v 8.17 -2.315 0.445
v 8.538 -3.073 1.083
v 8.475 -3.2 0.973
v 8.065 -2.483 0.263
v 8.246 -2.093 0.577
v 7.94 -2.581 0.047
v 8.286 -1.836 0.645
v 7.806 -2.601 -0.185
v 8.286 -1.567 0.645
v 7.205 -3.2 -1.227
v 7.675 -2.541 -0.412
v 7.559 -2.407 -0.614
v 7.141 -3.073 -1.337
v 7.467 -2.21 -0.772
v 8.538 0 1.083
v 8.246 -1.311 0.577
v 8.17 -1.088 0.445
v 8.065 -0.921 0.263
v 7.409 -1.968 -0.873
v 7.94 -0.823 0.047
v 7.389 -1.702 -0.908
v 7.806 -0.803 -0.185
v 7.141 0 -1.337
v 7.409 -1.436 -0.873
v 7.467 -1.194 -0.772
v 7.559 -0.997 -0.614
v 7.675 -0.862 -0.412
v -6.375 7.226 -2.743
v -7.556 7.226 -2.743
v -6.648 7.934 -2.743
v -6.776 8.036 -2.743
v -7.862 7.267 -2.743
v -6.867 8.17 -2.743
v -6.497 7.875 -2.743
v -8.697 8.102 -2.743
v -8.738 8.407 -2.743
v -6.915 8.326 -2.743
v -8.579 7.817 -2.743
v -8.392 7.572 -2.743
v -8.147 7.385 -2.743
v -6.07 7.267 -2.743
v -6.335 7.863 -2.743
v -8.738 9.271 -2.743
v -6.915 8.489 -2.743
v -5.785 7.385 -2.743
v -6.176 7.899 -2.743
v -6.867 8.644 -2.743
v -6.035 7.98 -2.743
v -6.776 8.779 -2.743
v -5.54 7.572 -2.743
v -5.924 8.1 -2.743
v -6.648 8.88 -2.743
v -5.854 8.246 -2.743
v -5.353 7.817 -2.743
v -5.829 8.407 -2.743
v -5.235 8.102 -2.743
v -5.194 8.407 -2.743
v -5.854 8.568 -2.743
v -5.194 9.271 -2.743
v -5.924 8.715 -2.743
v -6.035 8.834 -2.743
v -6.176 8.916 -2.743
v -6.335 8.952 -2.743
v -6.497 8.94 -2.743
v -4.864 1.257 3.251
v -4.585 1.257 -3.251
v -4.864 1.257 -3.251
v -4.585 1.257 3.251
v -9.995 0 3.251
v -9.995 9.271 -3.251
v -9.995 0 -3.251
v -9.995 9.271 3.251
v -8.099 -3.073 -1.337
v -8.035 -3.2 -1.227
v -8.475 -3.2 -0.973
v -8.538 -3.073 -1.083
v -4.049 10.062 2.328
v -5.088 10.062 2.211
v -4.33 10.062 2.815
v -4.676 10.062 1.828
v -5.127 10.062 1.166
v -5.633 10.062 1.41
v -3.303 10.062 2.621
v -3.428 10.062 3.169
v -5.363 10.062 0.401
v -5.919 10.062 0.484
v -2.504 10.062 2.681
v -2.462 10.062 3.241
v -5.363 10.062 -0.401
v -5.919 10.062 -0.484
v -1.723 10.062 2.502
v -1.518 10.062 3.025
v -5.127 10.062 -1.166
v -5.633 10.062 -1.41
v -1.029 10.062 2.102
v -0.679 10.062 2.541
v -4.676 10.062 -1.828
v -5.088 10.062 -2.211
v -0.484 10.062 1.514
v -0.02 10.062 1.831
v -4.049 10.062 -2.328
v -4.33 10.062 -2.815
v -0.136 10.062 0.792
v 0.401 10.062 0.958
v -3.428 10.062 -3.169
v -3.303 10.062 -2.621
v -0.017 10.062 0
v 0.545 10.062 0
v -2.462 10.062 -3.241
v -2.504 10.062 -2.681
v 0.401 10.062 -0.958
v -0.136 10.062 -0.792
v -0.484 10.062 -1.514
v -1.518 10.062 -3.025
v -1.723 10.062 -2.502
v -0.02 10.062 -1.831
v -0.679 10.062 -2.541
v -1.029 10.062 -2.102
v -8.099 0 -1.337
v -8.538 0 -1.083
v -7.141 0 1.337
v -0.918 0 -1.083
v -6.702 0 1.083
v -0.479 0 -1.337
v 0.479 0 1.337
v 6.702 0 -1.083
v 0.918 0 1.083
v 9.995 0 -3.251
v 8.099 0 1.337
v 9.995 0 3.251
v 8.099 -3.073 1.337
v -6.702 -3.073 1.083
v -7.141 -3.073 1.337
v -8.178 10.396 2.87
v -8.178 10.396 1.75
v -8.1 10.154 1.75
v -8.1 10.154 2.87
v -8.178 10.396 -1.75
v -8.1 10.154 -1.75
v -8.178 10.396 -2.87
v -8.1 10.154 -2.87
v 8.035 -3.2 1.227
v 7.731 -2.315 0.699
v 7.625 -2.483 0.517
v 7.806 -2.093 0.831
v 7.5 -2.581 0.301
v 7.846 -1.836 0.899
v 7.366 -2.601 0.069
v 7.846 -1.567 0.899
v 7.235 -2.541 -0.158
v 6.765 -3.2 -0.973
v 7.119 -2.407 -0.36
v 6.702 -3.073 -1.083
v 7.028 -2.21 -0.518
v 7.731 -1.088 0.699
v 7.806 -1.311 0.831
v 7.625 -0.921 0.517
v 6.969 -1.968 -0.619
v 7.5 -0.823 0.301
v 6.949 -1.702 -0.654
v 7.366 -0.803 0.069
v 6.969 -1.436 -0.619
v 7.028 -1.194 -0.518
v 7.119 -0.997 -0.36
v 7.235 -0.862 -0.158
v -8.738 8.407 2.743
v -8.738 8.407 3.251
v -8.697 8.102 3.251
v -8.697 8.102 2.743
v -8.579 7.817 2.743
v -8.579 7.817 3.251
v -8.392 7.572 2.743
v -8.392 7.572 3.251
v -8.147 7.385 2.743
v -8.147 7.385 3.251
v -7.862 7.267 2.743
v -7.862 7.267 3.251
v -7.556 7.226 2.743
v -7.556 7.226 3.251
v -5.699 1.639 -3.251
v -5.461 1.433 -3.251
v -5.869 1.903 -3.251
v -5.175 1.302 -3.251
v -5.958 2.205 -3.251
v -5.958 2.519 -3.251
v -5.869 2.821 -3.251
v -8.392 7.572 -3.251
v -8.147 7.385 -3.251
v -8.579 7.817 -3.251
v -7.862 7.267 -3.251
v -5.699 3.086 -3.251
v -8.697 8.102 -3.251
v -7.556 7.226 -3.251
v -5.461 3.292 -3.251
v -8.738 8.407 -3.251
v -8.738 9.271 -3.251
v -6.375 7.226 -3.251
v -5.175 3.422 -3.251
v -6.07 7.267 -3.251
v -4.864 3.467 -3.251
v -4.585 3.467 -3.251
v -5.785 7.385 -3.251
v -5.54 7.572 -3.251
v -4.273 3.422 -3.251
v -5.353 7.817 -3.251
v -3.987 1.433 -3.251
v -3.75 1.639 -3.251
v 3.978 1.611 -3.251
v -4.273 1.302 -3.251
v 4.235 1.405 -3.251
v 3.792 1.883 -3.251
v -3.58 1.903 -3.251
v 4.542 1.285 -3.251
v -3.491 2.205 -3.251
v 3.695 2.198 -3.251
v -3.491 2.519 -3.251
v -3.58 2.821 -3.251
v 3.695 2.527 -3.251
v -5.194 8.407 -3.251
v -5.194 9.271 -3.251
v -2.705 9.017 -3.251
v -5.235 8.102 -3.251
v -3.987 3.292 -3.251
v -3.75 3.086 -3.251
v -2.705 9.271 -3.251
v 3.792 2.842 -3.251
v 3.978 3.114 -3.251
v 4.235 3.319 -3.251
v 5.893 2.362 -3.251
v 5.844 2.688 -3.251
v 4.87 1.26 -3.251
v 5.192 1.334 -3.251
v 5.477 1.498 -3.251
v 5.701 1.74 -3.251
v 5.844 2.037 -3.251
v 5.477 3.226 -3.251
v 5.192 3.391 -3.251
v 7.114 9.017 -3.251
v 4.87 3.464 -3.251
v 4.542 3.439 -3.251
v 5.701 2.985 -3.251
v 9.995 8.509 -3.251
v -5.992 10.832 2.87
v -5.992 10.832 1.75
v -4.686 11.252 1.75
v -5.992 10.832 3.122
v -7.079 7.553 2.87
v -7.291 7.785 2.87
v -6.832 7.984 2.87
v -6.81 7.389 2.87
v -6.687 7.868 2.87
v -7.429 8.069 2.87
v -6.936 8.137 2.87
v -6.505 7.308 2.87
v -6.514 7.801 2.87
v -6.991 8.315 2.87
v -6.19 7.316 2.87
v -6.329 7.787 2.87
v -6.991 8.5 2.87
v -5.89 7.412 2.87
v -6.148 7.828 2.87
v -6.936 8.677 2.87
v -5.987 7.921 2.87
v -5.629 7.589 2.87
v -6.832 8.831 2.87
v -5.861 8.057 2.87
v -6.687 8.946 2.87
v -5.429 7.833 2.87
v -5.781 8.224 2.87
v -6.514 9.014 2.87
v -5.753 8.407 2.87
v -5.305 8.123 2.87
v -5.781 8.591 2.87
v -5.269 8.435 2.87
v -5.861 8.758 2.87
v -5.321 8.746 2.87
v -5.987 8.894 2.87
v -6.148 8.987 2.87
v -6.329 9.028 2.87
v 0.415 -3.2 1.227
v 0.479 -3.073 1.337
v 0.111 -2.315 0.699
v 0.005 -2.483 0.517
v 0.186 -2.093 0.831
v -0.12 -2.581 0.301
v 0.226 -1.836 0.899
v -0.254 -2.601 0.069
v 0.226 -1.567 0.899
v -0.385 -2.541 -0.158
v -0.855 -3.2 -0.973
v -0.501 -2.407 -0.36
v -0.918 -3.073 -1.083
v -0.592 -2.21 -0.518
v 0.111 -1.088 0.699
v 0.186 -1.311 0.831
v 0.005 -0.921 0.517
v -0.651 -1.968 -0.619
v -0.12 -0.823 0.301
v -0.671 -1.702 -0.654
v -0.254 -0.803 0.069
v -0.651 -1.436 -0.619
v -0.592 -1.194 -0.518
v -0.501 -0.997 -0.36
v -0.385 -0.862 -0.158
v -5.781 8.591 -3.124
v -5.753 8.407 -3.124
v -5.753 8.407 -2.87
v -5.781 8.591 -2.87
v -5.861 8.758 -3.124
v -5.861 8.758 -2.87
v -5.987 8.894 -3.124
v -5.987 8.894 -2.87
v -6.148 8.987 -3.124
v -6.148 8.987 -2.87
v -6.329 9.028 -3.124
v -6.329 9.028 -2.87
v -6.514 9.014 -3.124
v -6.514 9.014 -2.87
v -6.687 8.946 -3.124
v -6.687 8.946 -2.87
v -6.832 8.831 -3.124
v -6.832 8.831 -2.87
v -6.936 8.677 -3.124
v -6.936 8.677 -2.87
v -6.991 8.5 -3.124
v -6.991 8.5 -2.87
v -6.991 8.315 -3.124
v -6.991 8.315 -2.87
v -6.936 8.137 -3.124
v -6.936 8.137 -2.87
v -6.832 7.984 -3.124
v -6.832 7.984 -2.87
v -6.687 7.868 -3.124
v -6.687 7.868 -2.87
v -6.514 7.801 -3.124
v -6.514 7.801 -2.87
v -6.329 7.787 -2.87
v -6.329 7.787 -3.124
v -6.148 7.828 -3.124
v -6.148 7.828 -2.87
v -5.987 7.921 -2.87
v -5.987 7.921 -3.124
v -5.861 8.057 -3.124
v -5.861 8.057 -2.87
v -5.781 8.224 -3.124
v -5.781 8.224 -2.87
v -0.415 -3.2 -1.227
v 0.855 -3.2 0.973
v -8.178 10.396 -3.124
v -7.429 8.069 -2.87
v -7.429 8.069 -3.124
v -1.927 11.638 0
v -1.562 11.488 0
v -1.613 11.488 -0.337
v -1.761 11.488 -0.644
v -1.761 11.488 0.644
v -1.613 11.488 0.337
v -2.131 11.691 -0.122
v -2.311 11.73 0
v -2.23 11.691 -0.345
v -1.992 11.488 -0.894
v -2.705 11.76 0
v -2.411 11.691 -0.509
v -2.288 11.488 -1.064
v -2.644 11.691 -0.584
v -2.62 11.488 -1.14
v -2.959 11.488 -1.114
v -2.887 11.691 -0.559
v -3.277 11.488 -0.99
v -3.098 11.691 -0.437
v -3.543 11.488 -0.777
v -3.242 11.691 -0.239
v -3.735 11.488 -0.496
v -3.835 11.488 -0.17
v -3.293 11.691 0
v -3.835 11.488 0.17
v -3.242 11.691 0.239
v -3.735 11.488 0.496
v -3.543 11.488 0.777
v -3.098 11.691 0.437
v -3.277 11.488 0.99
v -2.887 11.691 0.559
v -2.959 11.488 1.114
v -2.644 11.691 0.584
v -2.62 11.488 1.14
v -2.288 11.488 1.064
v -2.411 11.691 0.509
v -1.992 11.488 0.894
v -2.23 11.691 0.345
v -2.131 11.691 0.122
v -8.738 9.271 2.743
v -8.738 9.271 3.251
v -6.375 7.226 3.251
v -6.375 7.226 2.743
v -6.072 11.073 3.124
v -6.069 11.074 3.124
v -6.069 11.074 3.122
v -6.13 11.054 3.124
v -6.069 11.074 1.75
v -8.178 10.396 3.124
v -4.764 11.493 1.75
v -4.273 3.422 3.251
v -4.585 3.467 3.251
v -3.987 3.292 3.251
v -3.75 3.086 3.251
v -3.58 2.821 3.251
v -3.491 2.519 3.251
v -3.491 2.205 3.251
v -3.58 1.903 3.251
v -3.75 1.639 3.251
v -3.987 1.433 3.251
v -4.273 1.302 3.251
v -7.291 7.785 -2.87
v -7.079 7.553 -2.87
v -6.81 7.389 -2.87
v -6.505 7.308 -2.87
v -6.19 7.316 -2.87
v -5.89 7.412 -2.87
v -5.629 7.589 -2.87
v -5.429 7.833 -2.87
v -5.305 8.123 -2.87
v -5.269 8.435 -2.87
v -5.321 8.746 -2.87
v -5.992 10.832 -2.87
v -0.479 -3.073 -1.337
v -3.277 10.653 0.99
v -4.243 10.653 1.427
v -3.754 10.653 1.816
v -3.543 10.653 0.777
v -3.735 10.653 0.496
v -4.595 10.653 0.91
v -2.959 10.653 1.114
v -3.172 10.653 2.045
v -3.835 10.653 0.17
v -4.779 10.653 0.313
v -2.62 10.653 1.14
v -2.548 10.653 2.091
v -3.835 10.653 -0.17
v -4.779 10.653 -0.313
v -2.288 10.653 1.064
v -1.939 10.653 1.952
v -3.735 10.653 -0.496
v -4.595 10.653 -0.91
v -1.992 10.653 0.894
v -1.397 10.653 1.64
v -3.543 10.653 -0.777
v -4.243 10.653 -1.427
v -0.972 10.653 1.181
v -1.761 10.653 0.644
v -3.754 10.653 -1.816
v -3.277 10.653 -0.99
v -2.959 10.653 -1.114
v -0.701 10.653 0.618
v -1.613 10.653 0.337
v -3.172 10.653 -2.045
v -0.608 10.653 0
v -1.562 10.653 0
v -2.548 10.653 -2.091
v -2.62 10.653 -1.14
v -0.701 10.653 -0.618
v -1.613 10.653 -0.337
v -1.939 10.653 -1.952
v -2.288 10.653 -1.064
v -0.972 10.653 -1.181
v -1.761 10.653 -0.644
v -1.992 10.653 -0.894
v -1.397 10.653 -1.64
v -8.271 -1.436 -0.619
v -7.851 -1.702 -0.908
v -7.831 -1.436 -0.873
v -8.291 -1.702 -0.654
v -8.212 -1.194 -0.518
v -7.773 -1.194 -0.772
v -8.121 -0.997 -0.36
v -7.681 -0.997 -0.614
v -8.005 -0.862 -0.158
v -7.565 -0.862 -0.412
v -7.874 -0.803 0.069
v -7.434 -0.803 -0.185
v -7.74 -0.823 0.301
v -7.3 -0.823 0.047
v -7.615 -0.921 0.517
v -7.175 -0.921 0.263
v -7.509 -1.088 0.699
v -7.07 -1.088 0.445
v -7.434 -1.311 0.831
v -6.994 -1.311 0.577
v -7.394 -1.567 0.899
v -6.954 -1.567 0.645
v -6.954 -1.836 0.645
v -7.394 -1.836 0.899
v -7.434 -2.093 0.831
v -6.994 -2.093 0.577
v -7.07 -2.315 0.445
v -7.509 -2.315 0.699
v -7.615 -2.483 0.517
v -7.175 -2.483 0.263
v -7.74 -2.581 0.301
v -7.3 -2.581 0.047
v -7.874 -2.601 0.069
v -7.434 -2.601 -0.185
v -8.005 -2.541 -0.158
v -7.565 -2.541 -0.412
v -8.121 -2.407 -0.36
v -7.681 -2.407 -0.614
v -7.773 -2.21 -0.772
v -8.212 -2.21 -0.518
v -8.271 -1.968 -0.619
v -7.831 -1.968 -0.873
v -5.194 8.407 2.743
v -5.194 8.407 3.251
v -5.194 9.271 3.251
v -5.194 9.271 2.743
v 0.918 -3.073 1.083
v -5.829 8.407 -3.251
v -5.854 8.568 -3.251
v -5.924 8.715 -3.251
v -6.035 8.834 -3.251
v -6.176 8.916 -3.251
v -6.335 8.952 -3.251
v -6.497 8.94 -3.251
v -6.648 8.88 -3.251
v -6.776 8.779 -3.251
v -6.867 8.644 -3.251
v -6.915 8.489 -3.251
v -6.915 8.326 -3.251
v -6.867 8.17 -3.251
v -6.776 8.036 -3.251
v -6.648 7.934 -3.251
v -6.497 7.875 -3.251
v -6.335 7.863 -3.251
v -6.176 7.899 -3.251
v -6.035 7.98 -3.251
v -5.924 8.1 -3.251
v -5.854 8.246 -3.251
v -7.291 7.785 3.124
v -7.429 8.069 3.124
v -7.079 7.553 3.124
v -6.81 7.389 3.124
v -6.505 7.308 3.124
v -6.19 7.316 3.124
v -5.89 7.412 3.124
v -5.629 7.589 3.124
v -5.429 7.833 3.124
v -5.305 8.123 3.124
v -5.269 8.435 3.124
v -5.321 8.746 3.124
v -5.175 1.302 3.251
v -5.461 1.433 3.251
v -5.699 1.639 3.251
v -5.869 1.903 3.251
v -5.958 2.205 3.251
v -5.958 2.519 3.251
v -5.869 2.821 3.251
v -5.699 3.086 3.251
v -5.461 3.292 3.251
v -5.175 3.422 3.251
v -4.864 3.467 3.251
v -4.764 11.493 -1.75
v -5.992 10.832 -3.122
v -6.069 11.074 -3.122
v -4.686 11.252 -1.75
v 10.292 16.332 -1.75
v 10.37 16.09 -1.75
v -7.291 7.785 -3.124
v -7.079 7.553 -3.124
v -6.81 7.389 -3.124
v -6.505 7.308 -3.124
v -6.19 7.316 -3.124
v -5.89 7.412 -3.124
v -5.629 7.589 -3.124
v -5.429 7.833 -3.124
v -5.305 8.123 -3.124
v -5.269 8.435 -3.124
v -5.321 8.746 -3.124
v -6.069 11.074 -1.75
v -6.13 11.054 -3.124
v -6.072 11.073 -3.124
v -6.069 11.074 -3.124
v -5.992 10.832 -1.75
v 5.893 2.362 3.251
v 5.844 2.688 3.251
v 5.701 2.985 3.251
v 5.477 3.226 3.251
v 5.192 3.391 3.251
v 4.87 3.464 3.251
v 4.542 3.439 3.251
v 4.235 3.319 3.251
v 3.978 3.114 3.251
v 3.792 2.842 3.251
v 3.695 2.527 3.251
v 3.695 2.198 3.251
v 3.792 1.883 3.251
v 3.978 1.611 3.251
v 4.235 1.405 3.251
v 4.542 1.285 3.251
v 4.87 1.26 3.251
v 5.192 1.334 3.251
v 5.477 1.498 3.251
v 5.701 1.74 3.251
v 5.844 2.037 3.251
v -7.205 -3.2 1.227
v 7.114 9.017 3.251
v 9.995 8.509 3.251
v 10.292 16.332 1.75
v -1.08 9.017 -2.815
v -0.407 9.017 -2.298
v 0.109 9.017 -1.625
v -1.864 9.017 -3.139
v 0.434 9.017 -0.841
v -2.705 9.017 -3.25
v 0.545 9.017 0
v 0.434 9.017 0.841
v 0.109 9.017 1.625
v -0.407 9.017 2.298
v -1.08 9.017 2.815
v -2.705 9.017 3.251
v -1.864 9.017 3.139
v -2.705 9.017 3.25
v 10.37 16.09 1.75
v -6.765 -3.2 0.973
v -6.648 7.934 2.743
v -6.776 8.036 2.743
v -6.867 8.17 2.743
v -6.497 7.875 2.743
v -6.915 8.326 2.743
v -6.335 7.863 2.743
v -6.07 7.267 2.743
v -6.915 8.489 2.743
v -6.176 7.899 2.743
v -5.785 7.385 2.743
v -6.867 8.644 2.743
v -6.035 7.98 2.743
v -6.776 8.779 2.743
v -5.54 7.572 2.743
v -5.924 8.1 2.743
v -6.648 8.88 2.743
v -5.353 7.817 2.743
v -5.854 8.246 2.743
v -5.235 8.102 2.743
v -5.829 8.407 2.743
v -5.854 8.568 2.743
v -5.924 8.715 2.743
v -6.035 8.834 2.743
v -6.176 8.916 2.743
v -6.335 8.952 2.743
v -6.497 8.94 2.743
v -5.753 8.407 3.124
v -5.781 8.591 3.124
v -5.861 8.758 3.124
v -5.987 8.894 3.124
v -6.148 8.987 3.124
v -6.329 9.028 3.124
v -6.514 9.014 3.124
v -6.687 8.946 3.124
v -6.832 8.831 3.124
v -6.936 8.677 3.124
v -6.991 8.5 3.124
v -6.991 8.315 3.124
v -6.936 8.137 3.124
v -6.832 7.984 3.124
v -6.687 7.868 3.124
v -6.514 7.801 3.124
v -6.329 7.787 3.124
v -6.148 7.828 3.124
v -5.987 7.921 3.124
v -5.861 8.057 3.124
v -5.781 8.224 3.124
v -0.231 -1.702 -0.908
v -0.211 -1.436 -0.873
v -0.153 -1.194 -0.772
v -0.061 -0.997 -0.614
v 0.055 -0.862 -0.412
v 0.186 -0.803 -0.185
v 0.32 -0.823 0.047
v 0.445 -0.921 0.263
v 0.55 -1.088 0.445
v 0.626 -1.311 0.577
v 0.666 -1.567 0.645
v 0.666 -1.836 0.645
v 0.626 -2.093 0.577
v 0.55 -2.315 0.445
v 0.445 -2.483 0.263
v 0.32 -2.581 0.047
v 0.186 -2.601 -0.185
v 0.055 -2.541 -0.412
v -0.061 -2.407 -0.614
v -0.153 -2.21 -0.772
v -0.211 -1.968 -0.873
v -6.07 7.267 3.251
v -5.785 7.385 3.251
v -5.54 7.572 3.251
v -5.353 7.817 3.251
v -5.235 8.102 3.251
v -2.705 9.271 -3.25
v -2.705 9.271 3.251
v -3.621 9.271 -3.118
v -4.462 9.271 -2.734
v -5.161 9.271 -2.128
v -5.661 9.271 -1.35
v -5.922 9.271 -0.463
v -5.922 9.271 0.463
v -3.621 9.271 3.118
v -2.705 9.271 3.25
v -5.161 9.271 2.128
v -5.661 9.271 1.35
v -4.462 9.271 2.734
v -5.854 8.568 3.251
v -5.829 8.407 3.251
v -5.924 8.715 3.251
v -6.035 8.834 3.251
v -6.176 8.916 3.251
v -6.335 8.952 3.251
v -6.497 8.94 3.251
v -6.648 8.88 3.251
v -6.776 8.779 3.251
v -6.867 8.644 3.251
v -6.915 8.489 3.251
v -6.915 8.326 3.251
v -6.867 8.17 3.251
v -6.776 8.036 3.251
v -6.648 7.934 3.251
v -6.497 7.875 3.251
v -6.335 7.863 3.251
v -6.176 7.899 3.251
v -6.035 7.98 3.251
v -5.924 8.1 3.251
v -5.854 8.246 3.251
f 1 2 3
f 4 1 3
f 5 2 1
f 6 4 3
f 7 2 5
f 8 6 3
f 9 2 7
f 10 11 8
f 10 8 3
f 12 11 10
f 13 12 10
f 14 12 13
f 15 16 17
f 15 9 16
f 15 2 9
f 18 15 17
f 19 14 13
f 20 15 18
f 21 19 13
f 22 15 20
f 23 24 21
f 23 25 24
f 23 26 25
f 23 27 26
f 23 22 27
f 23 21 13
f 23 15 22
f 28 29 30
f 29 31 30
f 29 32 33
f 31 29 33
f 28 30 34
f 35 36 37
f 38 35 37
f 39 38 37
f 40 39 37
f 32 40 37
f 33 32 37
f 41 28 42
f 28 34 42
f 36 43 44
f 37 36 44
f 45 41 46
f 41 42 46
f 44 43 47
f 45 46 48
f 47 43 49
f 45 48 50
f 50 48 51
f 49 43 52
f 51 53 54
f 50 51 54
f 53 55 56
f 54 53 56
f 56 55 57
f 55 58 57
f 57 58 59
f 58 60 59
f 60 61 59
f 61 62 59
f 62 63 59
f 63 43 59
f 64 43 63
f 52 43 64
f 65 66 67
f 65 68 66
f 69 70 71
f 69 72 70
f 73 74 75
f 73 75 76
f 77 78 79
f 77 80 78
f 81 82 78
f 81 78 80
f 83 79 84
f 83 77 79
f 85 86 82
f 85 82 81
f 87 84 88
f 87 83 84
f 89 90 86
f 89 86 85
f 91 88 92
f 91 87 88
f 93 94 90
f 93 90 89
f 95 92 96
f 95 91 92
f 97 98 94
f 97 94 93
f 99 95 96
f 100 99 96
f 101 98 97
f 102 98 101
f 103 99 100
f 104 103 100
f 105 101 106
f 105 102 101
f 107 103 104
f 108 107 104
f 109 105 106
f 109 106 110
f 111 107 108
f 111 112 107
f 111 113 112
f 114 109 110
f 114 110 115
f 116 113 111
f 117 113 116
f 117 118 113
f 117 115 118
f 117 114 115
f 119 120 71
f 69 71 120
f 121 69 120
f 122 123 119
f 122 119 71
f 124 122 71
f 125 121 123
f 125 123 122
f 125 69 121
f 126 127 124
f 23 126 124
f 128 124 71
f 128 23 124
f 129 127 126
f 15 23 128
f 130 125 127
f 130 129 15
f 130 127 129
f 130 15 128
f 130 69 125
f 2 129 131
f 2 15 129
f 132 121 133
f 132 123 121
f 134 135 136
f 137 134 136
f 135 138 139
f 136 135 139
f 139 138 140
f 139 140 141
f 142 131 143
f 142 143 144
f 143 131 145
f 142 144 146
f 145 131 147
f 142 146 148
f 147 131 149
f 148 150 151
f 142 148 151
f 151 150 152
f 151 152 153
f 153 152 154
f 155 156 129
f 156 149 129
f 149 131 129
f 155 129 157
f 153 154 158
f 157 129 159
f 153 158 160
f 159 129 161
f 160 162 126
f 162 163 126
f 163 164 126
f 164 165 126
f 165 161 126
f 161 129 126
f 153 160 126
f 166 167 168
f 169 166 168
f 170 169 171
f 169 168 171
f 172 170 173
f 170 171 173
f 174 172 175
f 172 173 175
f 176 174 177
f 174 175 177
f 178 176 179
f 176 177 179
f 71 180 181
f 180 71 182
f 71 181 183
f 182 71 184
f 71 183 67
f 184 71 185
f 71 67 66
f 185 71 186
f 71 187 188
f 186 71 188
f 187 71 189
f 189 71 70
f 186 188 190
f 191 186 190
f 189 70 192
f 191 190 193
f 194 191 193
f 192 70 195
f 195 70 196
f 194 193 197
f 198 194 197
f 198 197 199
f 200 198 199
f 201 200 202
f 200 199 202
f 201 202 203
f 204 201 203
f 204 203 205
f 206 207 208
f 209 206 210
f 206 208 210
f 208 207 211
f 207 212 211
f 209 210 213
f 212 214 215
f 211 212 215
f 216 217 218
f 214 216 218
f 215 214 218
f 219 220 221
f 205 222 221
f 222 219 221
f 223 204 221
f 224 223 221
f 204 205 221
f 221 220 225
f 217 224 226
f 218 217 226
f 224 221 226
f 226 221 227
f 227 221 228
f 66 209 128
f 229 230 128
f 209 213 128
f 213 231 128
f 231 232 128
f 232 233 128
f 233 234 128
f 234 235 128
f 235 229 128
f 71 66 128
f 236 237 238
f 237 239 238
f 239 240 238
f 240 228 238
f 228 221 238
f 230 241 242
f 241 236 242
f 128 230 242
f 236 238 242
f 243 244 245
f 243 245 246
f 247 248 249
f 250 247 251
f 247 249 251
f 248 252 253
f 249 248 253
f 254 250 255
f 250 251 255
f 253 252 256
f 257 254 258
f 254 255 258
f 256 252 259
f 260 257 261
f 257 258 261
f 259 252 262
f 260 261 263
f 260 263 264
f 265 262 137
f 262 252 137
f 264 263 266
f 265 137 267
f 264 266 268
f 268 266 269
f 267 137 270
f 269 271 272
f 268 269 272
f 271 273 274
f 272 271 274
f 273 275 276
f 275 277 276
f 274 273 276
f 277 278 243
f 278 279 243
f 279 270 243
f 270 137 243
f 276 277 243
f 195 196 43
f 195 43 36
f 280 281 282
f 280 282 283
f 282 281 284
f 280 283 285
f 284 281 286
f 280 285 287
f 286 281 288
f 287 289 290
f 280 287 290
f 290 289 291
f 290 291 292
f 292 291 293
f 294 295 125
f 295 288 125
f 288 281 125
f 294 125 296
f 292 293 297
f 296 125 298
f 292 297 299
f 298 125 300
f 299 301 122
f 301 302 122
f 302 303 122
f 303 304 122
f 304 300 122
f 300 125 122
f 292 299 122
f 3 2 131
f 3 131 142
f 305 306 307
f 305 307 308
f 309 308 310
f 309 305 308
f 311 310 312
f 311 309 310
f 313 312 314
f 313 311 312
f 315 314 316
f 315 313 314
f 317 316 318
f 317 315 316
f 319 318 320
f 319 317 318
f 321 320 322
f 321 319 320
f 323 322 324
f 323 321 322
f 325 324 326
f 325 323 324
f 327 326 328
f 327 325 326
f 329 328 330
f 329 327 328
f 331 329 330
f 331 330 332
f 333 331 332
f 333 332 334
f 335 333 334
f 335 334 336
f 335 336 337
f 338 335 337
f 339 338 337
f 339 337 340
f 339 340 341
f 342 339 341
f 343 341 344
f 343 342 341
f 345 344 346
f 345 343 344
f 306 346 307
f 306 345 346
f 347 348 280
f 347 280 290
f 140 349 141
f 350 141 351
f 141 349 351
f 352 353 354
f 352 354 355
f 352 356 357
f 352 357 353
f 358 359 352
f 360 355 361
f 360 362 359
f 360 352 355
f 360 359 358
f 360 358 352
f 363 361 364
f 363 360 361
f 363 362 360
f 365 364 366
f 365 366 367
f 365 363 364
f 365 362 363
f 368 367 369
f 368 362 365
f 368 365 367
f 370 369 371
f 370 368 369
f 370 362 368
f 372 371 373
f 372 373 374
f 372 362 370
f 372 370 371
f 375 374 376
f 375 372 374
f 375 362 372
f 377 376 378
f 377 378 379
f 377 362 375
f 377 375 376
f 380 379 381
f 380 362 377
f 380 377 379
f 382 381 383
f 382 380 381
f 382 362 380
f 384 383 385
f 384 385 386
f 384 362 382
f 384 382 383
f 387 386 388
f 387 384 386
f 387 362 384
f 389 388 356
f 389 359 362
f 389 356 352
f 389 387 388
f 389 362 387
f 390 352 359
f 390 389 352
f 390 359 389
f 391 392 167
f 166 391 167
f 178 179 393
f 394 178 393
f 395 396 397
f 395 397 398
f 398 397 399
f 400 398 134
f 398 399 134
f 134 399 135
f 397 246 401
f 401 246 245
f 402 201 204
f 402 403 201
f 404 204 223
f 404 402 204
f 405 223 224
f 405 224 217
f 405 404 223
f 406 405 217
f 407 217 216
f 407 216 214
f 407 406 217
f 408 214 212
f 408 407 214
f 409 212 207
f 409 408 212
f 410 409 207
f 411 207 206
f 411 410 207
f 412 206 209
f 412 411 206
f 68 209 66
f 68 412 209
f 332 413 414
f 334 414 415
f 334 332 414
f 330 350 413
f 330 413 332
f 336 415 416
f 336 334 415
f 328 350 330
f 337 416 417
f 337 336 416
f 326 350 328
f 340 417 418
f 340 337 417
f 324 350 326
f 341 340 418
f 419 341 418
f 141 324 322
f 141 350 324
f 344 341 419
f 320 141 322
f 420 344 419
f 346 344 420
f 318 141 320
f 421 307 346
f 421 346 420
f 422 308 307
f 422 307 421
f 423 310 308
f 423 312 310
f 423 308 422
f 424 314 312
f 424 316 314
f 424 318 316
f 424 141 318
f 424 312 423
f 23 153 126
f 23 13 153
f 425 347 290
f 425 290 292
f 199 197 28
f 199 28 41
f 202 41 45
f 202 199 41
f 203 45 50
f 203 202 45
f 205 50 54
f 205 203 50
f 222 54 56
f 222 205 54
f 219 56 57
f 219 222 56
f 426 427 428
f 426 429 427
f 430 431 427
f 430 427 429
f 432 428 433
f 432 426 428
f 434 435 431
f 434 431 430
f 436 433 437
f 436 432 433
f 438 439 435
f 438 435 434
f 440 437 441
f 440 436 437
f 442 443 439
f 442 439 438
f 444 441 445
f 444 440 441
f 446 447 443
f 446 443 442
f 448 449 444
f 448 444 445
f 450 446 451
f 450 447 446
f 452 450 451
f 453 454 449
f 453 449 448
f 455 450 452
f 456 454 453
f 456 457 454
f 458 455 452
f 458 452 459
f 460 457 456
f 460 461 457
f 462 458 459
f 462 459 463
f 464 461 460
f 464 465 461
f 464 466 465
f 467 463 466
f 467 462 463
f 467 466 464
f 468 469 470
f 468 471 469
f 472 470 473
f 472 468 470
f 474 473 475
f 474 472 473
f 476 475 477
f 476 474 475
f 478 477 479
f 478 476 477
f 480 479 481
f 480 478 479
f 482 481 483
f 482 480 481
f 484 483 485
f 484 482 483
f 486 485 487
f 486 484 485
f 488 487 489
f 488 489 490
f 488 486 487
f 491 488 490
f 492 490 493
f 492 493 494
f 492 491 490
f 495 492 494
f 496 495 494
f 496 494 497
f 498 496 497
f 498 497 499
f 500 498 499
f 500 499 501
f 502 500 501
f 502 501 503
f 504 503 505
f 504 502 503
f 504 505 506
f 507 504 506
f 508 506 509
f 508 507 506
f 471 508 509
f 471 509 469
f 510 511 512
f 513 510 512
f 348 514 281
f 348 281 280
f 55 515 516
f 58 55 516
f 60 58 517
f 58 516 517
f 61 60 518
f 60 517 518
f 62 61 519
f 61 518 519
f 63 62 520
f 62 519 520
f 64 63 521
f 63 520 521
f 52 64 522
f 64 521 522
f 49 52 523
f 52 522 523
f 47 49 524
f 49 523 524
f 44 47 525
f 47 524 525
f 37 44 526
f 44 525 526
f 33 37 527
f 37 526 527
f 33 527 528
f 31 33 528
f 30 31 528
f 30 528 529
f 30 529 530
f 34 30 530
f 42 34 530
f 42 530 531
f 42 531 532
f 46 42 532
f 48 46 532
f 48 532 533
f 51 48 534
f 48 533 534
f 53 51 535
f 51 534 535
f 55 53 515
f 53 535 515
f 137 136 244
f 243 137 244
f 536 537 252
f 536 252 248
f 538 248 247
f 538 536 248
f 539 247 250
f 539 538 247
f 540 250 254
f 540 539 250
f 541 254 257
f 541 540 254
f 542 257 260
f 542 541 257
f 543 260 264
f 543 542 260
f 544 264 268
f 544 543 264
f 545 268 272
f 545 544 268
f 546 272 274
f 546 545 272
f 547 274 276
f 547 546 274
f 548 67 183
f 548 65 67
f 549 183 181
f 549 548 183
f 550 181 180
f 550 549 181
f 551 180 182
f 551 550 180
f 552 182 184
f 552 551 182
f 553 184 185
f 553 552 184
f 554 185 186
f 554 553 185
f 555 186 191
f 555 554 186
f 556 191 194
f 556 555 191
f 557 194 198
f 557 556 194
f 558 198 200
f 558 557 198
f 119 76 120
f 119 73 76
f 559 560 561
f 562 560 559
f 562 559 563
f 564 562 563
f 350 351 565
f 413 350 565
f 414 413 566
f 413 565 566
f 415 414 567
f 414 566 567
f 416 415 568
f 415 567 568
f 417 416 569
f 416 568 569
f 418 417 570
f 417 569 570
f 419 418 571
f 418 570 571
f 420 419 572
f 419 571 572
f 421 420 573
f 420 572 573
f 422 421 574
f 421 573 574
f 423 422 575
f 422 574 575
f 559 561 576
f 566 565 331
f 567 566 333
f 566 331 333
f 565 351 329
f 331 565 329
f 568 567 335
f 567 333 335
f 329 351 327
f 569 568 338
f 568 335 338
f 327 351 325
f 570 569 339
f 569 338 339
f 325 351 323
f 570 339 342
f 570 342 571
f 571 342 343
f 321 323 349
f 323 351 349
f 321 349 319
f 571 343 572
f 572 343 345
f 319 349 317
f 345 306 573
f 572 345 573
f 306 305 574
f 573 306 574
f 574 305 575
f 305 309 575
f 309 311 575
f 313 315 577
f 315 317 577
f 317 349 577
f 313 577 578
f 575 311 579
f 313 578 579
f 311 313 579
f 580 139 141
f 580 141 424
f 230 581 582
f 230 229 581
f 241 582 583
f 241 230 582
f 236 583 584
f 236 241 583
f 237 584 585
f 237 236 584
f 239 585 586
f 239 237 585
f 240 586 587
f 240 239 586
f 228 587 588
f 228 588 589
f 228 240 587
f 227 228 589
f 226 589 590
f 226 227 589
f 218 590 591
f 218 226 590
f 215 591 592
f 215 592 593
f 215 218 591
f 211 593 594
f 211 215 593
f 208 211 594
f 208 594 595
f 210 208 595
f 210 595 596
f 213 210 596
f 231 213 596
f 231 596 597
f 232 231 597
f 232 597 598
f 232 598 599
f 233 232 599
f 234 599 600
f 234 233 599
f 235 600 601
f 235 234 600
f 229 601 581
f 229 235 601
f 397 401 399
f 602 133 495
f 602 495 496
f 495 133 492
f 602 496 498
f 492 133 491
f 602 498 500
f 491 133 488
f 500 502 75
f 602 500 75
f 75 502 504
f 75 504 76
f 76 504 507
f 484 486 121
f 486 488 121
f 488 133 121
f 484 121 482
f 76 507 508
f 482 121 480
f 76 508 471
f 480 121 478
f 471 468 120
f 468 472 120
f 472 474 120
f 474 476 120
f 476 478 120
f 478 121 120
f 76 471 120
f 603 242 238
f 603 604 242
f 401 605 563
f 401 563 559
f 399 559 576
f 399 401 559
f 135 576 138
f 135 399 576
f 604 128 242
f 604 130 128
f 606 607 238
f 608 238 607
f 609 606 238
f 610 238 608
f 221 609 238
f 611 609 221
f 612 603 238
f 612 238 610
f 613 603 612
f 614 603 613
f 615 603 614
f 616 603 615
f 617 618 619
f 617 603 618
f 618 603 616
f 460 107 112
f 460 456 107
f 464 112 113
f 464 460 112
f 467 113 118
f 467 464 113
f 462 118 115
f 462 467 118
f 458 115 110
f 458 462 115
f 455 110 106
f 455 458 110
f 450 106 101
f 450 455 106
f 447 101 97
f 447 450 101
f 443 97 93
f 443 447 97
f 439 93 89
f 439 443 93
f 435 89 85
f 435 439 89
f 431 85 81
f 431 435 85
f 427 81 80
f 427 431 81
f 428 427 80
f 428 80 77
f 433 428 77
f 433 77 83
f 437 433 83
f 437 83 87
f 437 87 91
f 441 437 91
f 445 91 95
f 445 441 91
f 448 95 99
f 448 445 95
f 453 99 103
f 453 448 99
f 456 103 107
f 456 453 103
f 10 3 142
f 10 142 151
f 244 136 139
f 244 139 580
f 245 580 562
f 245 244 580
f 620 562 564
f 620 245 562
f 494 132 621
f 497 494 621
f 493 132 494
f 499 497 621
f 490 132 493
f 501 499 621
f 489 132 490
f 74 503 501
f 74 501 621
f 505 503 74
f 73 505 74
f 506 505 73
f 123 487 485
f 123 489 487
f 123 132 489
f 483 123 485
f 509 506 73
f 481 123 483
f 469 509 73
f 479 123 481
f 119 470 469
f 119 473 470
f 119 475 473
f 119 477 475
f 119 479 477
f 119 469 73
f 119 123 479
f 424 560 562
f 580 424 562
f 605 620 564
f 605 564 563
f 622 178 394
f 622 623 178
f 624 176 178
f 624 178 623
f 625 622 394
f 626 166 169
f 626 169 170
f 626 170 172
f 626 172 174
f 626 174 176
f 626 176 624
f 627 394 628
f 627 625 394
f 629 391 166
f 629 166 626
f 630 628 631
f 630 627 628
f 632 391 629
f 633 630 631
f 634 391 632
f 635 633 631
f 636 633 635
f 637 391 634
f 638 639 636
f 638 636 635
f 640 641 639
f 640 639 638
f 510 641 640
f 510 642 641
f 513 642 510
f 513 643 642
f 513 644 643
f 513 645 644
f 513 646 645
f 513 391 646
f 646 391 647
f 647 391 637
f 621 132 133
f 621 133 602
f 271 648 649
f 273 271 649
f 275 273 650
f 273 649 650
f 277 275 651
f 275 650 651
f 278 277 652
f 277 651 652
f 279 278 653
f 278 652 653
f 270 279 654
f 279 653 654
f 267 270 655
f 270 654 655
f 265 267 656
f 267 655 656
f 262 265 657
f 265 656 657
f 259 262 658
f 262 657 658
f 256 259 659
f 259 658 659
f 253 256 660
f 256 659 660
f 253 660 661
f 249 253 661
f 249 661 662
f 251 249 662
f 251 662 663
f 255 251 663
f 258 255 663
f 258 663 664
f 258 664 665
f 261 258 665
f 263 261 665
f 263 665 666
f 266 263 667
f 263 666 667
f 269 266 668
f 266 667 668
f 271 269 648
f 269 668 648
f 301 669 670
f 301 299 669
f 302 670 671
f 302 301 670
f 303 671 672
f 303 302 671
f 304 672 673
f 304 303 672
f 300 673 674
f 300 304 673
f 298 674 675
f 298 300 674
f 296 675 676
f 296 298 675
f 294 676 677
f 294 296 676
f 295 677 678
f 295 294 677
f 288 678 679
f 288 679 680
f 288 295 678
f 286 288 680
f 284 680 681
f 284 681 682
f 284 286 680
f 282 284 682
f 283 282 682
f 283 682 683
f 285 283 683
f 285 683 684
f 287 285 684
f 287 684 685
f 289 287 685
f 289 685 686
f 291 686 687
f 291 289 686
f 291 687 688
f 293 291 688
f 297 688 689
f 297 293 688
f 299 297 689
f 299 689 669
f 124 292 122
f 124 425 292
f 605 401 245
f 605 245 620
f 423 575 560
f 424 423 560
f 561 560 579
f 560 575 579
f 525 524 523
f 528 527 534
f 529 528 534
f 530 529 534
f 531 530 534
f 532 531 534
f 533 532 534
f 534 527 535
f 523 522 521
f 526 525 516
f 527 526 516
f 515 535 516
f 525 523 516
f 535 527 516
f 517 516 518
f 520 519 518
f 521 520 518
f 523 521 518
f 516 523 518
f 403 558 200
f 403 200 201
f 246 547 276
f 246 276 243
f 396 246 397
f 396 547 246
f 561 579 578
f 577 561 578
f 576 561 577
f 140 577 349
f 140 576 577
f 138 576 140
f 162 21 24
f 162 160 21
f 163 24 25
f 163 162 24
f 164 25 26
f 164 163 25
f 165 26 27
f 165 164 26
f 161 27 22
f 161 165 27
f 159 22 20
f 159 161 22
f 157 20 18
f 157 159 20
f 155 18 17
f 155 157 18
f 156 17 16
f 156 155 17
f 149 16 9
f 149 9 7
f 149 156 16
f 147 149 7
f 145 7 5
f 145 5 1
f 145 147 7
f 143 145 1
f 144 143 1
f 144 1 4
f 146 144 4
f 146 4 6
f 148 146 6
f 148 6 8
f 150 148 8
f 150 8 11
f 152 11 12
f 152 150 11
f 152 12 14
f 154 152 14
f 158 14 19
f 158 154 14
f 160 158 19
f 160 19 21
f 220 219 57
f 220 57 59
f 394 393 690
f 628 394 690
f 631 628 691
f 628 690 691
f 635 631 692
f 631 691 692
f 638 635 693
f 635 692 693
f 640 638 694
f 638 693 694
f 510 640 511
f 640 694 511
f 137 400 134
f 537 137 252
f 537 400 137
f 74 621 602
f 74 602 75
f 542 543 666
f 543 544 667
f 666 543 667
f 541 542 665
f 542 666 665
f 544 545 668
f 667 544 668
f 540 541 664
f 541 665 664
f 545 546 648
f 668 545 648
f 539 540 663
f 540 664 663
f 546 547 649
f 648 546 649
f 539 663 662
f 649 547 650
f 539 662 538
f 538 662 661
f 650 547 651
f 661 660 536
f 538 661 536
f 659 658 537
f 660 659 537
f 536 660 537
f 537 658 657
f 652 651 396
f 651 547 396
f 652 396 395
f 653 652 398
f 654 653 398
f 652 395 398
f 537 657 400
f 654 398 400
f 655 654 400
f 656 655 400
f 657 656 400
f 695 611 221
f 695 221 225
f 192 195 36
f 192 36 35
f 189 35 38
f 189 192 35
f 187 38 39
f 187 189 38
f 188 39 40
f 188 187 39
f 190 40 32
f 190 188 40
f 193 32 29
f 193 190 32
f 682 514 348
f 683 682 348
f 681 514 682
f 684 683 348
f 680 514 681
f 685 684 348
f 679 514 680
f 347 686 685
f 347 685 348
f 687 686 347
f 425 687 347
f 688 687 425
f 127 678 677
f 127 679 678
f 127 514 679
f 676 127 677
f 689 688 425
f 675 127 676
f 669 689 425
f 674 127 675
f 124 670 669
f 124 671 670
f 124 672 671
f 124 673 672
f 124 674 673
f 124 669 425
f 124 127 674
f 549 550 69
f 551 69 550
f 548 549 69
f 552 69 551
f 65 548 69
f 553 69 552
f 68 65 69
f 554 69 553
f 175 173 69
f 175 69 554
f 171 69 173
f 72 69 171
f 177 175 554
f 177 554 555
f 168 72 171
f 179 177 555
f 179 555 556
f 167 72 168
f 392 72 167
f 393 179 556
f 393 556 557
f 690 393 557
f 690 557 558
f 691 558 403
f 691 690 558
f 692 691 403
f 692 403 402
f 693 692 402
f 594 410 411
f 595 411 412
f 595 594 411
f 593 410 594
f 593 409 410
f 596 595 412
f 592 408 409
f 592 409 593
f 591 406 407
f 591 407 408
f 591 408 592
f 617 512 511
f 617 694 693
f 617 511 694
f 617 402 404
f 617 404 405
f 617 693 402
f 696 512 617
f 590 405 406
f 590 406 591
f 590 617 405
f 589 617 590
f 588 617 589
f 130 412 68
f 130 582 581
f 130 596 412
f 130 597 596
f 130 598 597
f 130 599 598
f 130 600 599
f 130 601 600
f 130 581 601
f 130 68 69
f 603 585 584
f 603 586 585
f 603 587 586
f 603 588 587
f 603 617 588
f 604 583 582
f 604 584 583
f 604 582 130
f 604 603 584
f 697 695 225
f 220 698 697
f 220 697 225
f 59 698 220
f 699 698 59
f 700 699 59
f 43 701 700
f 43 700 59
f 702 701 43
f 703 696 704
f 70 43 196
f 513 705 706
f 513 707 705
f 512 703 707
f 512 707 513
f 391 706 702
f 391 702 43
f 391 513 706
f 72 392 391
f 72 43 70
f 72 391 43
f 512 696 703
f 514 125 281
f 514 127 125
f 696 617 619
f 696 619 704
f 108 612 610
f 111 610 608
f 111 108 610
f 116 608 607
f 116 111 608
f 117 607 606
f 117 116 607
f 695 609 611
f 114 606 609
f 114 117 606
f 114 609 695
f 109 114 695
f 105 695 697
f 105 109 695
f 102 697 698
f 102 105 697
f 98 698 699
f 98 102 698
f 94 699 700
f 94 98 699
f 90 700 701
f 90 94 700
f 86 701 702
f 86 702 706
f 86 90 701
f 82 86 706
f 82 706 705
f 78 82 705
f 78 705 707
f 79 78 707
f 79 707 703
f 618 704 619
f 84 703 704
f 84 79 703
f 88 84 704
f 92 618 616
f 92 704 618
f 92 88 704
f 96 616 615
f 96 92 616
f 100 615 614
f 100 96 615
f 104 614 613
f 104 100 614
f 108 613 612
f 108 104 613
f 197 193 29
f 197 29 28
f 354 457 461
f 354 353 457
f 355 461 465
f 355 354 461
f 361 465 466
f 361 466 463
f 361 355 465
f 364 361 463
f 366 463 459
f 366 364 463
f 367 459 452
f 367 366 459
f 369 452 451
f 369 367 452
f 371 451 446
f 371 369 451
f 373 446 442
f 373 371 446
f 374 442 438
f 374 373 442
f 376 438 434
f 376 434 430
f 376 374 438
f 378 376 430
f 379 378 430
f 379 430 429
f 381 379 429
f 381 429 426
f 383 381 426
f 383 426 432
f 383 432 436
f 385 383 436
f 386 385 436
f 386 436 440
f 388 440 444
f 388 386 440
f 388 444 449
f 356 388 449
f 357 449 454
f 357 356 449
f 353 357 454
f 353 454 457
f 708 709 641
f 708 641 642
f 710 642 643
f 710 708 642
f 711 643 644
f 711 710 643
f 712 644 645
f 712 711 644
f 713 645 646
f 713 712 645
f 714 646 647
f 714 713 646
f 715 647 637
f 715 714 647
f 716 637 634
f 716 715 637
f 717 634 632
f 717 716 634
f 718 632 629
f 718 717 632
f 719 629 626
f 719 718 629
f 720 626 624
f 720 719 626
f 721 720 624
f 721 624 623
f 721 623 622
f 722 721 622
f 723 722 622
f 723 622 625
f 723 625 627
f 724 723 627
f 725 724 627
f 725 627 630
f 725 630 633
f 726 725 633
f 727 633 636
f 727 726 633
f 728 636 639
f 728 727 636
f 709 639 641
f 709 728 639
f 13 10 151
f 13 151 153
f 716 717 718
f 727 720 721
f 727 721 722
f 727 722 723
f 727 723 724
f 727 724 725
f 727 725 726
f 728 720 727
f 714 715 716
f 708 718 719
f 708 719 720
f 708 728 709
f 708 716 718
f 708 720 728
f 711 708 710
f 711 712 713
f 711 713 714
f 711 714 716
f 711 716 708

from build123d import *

# Parameters (mm, degrees)
SKETCH2_R          = 1.1049
EXTRUDE1_DEPTH     = 3.2512
SKETCH5_R          = 0.5461
CUT_EXTRUDE2_DEPTH = 0.508
SKETCH10_R         = 0.9017
EXTRUDE6_DEPTH     = 0.254
LPATTERN1_COUNT    = 3
LPATTERN1_PITCH    = 7.62
EXTRUDE3_DEPTH     = 1.75
EXTRUDE4_START     = -0.127
SKETCH8_R          = 0.6223
EXTRUDE4_DEPTH     = 0.254
EXTRUDE5_DEPTH     = 1.1202


with BuildPart() as part:
    # Sketch2 → Extrude1 (new, symmetric)
    with BuildSketch(Plane.XY):
        Polygon((9.9949, 8.509), (7.113888836, 9.017), (-2.7051, 9.017), (-2.7051, 9.271), (-9.9949, 9.271), (-9.9949, 0), (9.9949, 0), align=None)
        with Locations((4.7879, 2.3622)):
            Circle(SKETCH2_R, mode=Mode.SUBTRACT)
        with BuildLine():
            Line((-4.8641, 3.4671), (-4.5847, 3.4671))
            ThreePointArc((-4.5847, 3.4671), (-3.4798, 2.3622), (-4.5847, 1.2573))
            Line((-4.5847, 1.2573), (-4.8641, 1.2573))
            ThreePointArc((-4.8641, 1.2573), (-5.969, 2.3622), (-4.8641, 3.4671))
        make_face(mode=Mode.SUBTRACT)
    extrude(amount=EXTRUDE1_DEPTH, both=True)

    # Sketch11 → Revolve1 (revolve)
    with BuildSketch(Plane(origin=(0.218023231, -2.526963533, 0), x_dir=(1, 0, 0), z_dir=(0, 0, 1)), mode=Mode.PRIVATE) as revolve1_sk:
        with BuildLine():
            Line((-6.173123231, 11.543963533), (-6.173123231, 12.589163533))
            Line((-6.173123231, 12.589163533), (-5.611223993, 12.589163533))
            Line((-5.611223993, 12.589163533), (-5.020434283, 13.179953243))
            Line((-5.020434283, 13.179953243), (-4.066123231, 13.179953243))
            Line((-4.066123231, 13.179953243), (-4.066123231, 14.015456063))
            ThreePointArc((-4.066123231, 14.015456063), (-3.510548535, 14.218303252), (-2.923123231, 14.287163533))
            Line((-2.923123231, 14.287163533), (-2.923123231, 11.543963533))
            Line((-2.923123231, 11.543963533), (-6.173123231, 11.543963533))
        make_face()
    revolve(revolve1_sk.sketch.rotate(Axis((-2.7051, 11.7602, 0), (0, 1, 0)), 180), axis=Axis((-2.7051, 11.7602, 0), (0, 1, 0)))

    # Sketch5 → Cut-Extrude2 (cut)
    with BuildSketch(Plane.XY.offset(3.2512)):
        with BuildLine():
            Line((-8.7376, 9.271), (-8.7376, 8.4074))
            ThreePointArc((-8.7376, 8.4074), (-8.391663819, 7.572236181), (-7.5565, 7.2263))
            Line((-7.5565, 7.2263), (-6.3754, 7.2263))
            ThreePointArc((-6.3754, 7.2263), (-5.540236181, 7.572236181), (-5.1943, 8.4074))
            Line((-5.1943, 8.4074), (-5.1943, 9.271))
            Line((-5.1943, 9.271), (-8.7376, 9.271))
        make_face()
        with Locations((-6.3754, 8.4074)):
            Circle(SKETCH5_R, mode=Mode.SUBTRACT)
    cut_extrude2 = extrude(amount=-CUT_EXTRUDE2_DEPTH, mode=Mode.SUBTRACT)

    # Mirror1: Cut-Extrude2 across plane
    add(cut_extrude2.mirror(Plane.XY), mode=Mode.SUBTRACT)

    # Sketch10 → Extrude6 (add, symmetric)
    with BuildSketch(Plane(origin=(-7.58825, 0, 0.054992613), x_dir=(-0.500000000000001, 0, -0.8660254037844382), z_dir=(0.8660254037844382, 0, -0.500000000000001))):
        Polygon((-1.3335, 0), (-1.3335, -3.0734), (-1.2065, -3.2004), (1.3335, -3.2004), (1.4605, -3.0734), (1.4605, 0), align=None)
        with Locations((0.0635, -1.7018)):
            Circle(SKETCH10_R, mode=Mode.SUBTRACT)
    extrude6 = extrude(amount=EXTRUDE6_DEPTH, both=True)

    # LPattern1: Extrude6 ×3
    with Locations(*[(i * LPATTERN1_PITCH, 0, 0) for i in range(1, LPATTERN1_COUNT)]):
        add(extrude6)


with BuildPart() as body_2:
    # Sketch6 → Extrude3 (new, symmetric)
    with BuildSketch(Plane.XY):
        Polygon((-8.099837794, 10.154301357), (10.369675974, 16.090382655), (10.291956146, 16.3322), (-8.177557622, 10.396118702), align=None)
    extrude(amount=EXTRUDE3_DEPTH, both=True)


with BuildPart() as body_3:
    # Sketch8 → Extrude4 (new body)
    with BuildSketch(Plane.XY.offset(3.2512).offset(EXTRUDE4_START)):
        with BuildLine():
            Line((-5.3213, 8.746186574), (-6.069357622, 11.07369185))
            Line((-6.069357622, 11.07369185), (-8.177557622, 10.396118702))
            Line((-8.177557622, 10.396118702), (-7.4295, 8.068613426))
            ThreePointArc((-7.4295, 8.068613426), (-6.036613426, 7.3533), (-5.3213, 8.746186574))
        make_face()
        with Locations((-6.3754, 8.4074)):
            Circle(SKETCH8_R, mode=Mode.SUBTRACT)
    extrude(amount=-EXTRUDE4_DEPTH)

    # Sketch9 → Extrude5 (add)
    with BuildSketch(Plane.XY.offset(1.75)):
        Polygon((-5.991637794, 10.831874505), (-6.069357622, 11.07369185), (-8.177557622, 10.396118702), (-8.099837794, 10.154301357), align=None)
    extrude(amount=EXTRUDE5_DEPTH)


with BuildPart() as body_4:
    # Mirror7: mirrored copy
    add(body_3.part.mirror(Plane.XY))

    # Combine1: union body 2, body 3
    add(body_2.part)
    add(body_3.part)

    # Chamfer1
    # the kernel refuses this chamfer: 1.3716 mm, written as the material it adds along each edge
    with BuildSketch(Plane(origin=(-5.991637794, 10.831874505, -1.75), x_dir=(-0.026177086166058735, -0.008413286542090954, -0.9996219169112968), z_dir=(-0.3059835720550073, 0.9520367921632327, 0))) as chamfer1_piece_1_section:
        with BuildLine():
            Line((1.410928155, 0), (-0.077560078, -1.408794766))
            Line((-0.077560078, -1.408794766), (-0.104981706, -1.408040499))
            ThreePointArc((-0.104981706, -1.408040499), (-0.046811648, -0.704176463), (-0.027421628, 0.000754267))
            Line((-0.027421628, 0.000754267), (0.000754267, 0.027421628))
            ThreePointArc((0.000754267, 0.027421628), (0.705684997, 0.008031609), (1.411682421, 0.027421628))
            Line((1.411682421, 0.027421628), (1.410928155, 0))
        make_face()
    chamfer1_piece_1 = extrude(amount=0.254, mode=Mode.PRIVATE)
    chamfer1_piece_1 = split(chamfer1_piece_1, bisect_by=Plane(origin=(-5.982708869, 10.968142458, -2.8702), z_dir=(0, 0, -1)), keep=Keep.TOP, mode=Mode.PRIVATE)
    chamfer1_piece_1 = split(chamfer1_piece_1, bisect_by=Plane(origin=(-5.982708869, 10.968142458, -3.1242), z_dir=(0, 0, 1)), keep=Keep.TOP, mode=Mode.PRIVATE)
    add(chamfer1_piece_1)
    with BuildSketch(Plane(origin=(-4.912335703, 7.47373572, -1.75), x_dir=(-0.026177086166058915, -0.00841328654209101, -0.9996219169112968), z_dir=(-0.3059835720550073, 0.9520367921632327, 0))) as chamfer1_piece_2_section:
        with BuildLine():
            Line((1.410928155, 0), (-0.077560078, -1.408794766))
            Line((-0.077560078, -1.408794766), (-0.104981706, -1.408040499))
            ThreePointArc((-0.104981706, -1.408040499), (-0.046811648, -0.704176463), (-0.027421628, 0.000754267))
            Line((-0.027421628, 0.000754267), (0.000754267, 0.027421628))
            ThreePointArc((0.000754267, 0.027421628), (0.705684997, 0.008031609), (1.411682421, 0.027421628))
            Line((1.411682421, 0.027421628), (1.410928155, 0))
        make_face()
    chamfer1_piece_2 = extrude(amount=3.781320386, mode=Mode.PRIVATE)
    chamfer1_piece_2 = split(chamfer1_piece_2, bisect_by=Plane(origin=(-5.352514143, 8.736154383, -2.8702), z_dir=(0, 0, -1)), keep=Keep.TOP, mode=Mode.PRIVATE)
    chamfer1_piece_2 = split(chamfer1_piece_2, bisect_by=Plane(origin=(-5.352514143, 8.736154383, -3.1242), z_dir=(0, 0, 1)), keep=Keep.TOP, mode=Mode.PRIVATE)
    chamfer1_piece_2 = chamfer1_piece_2 & Plane(origin=(-6.3754, 8.4074, -3.007546716), x_dir=(-0.952036792163233, -0.3059835720550061, 0), z_dir=(0, 0, -1)) * Cylinder(1.107205109, 14, mode=Mode.PRIVATE)
    add(chamfer1_piece_2)
    with BuildSketch(Plane(origin=(-5.991637794, 10.831874505, -1.75), x_dir=(-0.026177086166058735, -0.008413286542090954, -0.9996219169112968), z_dir=(-0.3059835720550073, 0.9520367921632327, 0))) as chamfer1_piece_3_section:
        with BuildLine():
            Line((1.410928155, 0), (-0.077560078, -1.408794766))
            Line((-0.077560078, -1.408794766), (-0.104981706, -1.408040499))
            ThreePointArc((-0.104981706, -1.408040499), (-0.046811648, -0.704176463), (-0.027421628, 0.000754267))
            Line((-0.027421628, 0.000754267), (0.000754267, 0.027421628))
            ThreePointArc((0.000754267, 0.027421628), (0.705684997, 0.008031609), (1.411682421, 0.027421628))
            Line((1.411682421, 0.027421628), (1.410928155, 0))
        make_face()
    chamfer1_piece_3 = extrude(amount=0.254, mode=Mode.PRIVATE)
    chamfer1_piece_3 = split(chamfer1_piece_3, bisect_by=Plane(origin=(-5.581534864, 11.097079339, -2.8702), z_dir=(0, 0, 1)), keep=Keep.TOP, mode=Mode.PRIVATE)
    add(chamfer1_piece_3)
    with BuildSketch(Plane(origin=(-5.991637794, 10.831874505, 1.75), x_dir=(-0.026177086166058735, -0.008413286542090954, 0.9996219169112968), z_dir=(-0.3059835720550073, 0.9520367921632327, 0))) as chamfer1_piece_4_section:
        with BuildLine():
            Line((1.410928155, 0), (-0.077560078, 1.408794766))
            Line((-0.077560078, 1.408794766), (-0.104981706, 1.408040499))
            ThreePointArc((-0.104981706, 1.408040499), (-0.046811648, 0.704176463), (-0.027421628, -0.000754267))
            Line((-0.027421628, -0.000754267), (0.000754267, -0.027421628))
            ThreePointArc((0.000754267, -0.027421628), (0.705684997, -0.008031609), (1.411682421, -0.027421628))
            Line((1.411682421, -0.027421628), (1.410928155, 0))
        make_face()
    chamfer1_piece_4 = extrude(amount=0.254, mode=Mode.PRIVATE)
    chamfer1_piece_4 = split(chamfer1_piece_4, bisect_by=Plane(origin=(-5.982708869, 10.968142458, 2.8702), z_dir=(0, 0, 1)), keep=Keep.TOP, mode=Mode.PRIVATE)
    chamfer1_piece_4 = split(chamfer1_piece_4, bisect_by=Plane(origin=(-5.982708869, 10.968142458, 3.1242), z_dir=(0, 0, -1)), keep=Keep.TOP, mode=Mode.PRIVATE)
    add(chamfer1_piece_4)
    with BuildSketch(Plane(origin=(-4.912335703, 7.47373572, 1.75), x_dir=(-0.026177086166058915, -0.00841328654209101, 0.9996219169112968), z_dir=(-0.3059835720550073, 0.9520367921632327, 0))) as chamfer1_piece_5_section:
        with BuildLine():
            Line((1.410928155, 0), (-0.077560078, 1.408794766))
            Line((-0.077560078, 1.408794766), (-0.104981706, 1.408040499))
            ThreePointArc((-0.104981706, 1.408040499), (-0.046811648, 0.704176463), (-0.027421628, -0.000754267))
            Line((-0.027421628, -0.000754267), (0.000754267, -0.027421628))
            ThreePointArc((0.000754267, -0.027421628), (0.705684997, -0.008031609), (1.411682421, -0.027421628))
            Line((1.411682421, -0.027421628), (1.410928155, 0))
        make_face()
    chamfer1_piece_5 = extrude(amount=3.781320386, mode=Mode.PRIVATE)
    chamfer1_piece_5 = split(chamfer1_piece_5, bisect_by=Plane(origin=(-5.352514143, 8.736154383, 2.8702), z_dir=(0, 0, 1)), keep=Keep.TOP, mode=Mode.PRIVATE)
    chamfer1_piece_5 = chamfer1_piece_5 & Plane(origin=(-6.3754, 8.4074, 3.007546716), x_dir=(-0.952036792163233, -0.3059835720550061, 0), z_dir=(0, 0, 1)) * Cylinder(1.107205109, 14, mode=Mode.PRIVATE)
    chamfer1_piece_5 = split(chamfer1_piece_5, bisect_by=Plane(origin=(-5.352514143, 8.736154383, 3.1242), z_dir=(0, 0, -1)), keep=Keep.TOP, mode=Mode.PRIVATE)
    add(chamfer1_piece_5)
    with BuildSketch(Plane(origin=(-5.991637794, 10.831874505, 1.75), x_dir=(-0.026177086166058735, -0.008413286542090954, 0.9996219169112968), z_dir=(-0.3059835720550073, 0.9520367921632327, 0))) as chamfer1_piece_6_section:
        with BuildLine():
            Line((1.410928155, 0), (-0.077560078, 1.408794766))
            Line((-0.077560078, 1.408794766), (-0.104981706, 1.408040499))
            ThreePointArc((-0.104981706, 1.408040499), (-0.046811648, 0.704176463), (-0.027421628, -0.000754267))
            Line((-0.027421628, -0.000754267), (0.000754267, -0.027421628))
            ThreePointArc((0.000754267, -0.027421628), (0.705684997, -0.008031609), (1.411682421, -0.027421628))
            Line((1.411682421, -0.027421628), (1.410928155, 0))
        make_face()
    chamfer1_piece_6 = extrude(amount=0.254, mode=Mode.PRIVATE)
    chamfer1_piece_6 = split(chamfer1_piece_6, bisect_by=Plane(origin=(-5.581534864, 11.097079339, 2.8702), z_dir=(0, 0, -1)), keep=Keep.TOP, mode=Mode.PRIVATE)
    add(chamfer1_piece_6)


solid = Compound([part.part, body_4.part])
